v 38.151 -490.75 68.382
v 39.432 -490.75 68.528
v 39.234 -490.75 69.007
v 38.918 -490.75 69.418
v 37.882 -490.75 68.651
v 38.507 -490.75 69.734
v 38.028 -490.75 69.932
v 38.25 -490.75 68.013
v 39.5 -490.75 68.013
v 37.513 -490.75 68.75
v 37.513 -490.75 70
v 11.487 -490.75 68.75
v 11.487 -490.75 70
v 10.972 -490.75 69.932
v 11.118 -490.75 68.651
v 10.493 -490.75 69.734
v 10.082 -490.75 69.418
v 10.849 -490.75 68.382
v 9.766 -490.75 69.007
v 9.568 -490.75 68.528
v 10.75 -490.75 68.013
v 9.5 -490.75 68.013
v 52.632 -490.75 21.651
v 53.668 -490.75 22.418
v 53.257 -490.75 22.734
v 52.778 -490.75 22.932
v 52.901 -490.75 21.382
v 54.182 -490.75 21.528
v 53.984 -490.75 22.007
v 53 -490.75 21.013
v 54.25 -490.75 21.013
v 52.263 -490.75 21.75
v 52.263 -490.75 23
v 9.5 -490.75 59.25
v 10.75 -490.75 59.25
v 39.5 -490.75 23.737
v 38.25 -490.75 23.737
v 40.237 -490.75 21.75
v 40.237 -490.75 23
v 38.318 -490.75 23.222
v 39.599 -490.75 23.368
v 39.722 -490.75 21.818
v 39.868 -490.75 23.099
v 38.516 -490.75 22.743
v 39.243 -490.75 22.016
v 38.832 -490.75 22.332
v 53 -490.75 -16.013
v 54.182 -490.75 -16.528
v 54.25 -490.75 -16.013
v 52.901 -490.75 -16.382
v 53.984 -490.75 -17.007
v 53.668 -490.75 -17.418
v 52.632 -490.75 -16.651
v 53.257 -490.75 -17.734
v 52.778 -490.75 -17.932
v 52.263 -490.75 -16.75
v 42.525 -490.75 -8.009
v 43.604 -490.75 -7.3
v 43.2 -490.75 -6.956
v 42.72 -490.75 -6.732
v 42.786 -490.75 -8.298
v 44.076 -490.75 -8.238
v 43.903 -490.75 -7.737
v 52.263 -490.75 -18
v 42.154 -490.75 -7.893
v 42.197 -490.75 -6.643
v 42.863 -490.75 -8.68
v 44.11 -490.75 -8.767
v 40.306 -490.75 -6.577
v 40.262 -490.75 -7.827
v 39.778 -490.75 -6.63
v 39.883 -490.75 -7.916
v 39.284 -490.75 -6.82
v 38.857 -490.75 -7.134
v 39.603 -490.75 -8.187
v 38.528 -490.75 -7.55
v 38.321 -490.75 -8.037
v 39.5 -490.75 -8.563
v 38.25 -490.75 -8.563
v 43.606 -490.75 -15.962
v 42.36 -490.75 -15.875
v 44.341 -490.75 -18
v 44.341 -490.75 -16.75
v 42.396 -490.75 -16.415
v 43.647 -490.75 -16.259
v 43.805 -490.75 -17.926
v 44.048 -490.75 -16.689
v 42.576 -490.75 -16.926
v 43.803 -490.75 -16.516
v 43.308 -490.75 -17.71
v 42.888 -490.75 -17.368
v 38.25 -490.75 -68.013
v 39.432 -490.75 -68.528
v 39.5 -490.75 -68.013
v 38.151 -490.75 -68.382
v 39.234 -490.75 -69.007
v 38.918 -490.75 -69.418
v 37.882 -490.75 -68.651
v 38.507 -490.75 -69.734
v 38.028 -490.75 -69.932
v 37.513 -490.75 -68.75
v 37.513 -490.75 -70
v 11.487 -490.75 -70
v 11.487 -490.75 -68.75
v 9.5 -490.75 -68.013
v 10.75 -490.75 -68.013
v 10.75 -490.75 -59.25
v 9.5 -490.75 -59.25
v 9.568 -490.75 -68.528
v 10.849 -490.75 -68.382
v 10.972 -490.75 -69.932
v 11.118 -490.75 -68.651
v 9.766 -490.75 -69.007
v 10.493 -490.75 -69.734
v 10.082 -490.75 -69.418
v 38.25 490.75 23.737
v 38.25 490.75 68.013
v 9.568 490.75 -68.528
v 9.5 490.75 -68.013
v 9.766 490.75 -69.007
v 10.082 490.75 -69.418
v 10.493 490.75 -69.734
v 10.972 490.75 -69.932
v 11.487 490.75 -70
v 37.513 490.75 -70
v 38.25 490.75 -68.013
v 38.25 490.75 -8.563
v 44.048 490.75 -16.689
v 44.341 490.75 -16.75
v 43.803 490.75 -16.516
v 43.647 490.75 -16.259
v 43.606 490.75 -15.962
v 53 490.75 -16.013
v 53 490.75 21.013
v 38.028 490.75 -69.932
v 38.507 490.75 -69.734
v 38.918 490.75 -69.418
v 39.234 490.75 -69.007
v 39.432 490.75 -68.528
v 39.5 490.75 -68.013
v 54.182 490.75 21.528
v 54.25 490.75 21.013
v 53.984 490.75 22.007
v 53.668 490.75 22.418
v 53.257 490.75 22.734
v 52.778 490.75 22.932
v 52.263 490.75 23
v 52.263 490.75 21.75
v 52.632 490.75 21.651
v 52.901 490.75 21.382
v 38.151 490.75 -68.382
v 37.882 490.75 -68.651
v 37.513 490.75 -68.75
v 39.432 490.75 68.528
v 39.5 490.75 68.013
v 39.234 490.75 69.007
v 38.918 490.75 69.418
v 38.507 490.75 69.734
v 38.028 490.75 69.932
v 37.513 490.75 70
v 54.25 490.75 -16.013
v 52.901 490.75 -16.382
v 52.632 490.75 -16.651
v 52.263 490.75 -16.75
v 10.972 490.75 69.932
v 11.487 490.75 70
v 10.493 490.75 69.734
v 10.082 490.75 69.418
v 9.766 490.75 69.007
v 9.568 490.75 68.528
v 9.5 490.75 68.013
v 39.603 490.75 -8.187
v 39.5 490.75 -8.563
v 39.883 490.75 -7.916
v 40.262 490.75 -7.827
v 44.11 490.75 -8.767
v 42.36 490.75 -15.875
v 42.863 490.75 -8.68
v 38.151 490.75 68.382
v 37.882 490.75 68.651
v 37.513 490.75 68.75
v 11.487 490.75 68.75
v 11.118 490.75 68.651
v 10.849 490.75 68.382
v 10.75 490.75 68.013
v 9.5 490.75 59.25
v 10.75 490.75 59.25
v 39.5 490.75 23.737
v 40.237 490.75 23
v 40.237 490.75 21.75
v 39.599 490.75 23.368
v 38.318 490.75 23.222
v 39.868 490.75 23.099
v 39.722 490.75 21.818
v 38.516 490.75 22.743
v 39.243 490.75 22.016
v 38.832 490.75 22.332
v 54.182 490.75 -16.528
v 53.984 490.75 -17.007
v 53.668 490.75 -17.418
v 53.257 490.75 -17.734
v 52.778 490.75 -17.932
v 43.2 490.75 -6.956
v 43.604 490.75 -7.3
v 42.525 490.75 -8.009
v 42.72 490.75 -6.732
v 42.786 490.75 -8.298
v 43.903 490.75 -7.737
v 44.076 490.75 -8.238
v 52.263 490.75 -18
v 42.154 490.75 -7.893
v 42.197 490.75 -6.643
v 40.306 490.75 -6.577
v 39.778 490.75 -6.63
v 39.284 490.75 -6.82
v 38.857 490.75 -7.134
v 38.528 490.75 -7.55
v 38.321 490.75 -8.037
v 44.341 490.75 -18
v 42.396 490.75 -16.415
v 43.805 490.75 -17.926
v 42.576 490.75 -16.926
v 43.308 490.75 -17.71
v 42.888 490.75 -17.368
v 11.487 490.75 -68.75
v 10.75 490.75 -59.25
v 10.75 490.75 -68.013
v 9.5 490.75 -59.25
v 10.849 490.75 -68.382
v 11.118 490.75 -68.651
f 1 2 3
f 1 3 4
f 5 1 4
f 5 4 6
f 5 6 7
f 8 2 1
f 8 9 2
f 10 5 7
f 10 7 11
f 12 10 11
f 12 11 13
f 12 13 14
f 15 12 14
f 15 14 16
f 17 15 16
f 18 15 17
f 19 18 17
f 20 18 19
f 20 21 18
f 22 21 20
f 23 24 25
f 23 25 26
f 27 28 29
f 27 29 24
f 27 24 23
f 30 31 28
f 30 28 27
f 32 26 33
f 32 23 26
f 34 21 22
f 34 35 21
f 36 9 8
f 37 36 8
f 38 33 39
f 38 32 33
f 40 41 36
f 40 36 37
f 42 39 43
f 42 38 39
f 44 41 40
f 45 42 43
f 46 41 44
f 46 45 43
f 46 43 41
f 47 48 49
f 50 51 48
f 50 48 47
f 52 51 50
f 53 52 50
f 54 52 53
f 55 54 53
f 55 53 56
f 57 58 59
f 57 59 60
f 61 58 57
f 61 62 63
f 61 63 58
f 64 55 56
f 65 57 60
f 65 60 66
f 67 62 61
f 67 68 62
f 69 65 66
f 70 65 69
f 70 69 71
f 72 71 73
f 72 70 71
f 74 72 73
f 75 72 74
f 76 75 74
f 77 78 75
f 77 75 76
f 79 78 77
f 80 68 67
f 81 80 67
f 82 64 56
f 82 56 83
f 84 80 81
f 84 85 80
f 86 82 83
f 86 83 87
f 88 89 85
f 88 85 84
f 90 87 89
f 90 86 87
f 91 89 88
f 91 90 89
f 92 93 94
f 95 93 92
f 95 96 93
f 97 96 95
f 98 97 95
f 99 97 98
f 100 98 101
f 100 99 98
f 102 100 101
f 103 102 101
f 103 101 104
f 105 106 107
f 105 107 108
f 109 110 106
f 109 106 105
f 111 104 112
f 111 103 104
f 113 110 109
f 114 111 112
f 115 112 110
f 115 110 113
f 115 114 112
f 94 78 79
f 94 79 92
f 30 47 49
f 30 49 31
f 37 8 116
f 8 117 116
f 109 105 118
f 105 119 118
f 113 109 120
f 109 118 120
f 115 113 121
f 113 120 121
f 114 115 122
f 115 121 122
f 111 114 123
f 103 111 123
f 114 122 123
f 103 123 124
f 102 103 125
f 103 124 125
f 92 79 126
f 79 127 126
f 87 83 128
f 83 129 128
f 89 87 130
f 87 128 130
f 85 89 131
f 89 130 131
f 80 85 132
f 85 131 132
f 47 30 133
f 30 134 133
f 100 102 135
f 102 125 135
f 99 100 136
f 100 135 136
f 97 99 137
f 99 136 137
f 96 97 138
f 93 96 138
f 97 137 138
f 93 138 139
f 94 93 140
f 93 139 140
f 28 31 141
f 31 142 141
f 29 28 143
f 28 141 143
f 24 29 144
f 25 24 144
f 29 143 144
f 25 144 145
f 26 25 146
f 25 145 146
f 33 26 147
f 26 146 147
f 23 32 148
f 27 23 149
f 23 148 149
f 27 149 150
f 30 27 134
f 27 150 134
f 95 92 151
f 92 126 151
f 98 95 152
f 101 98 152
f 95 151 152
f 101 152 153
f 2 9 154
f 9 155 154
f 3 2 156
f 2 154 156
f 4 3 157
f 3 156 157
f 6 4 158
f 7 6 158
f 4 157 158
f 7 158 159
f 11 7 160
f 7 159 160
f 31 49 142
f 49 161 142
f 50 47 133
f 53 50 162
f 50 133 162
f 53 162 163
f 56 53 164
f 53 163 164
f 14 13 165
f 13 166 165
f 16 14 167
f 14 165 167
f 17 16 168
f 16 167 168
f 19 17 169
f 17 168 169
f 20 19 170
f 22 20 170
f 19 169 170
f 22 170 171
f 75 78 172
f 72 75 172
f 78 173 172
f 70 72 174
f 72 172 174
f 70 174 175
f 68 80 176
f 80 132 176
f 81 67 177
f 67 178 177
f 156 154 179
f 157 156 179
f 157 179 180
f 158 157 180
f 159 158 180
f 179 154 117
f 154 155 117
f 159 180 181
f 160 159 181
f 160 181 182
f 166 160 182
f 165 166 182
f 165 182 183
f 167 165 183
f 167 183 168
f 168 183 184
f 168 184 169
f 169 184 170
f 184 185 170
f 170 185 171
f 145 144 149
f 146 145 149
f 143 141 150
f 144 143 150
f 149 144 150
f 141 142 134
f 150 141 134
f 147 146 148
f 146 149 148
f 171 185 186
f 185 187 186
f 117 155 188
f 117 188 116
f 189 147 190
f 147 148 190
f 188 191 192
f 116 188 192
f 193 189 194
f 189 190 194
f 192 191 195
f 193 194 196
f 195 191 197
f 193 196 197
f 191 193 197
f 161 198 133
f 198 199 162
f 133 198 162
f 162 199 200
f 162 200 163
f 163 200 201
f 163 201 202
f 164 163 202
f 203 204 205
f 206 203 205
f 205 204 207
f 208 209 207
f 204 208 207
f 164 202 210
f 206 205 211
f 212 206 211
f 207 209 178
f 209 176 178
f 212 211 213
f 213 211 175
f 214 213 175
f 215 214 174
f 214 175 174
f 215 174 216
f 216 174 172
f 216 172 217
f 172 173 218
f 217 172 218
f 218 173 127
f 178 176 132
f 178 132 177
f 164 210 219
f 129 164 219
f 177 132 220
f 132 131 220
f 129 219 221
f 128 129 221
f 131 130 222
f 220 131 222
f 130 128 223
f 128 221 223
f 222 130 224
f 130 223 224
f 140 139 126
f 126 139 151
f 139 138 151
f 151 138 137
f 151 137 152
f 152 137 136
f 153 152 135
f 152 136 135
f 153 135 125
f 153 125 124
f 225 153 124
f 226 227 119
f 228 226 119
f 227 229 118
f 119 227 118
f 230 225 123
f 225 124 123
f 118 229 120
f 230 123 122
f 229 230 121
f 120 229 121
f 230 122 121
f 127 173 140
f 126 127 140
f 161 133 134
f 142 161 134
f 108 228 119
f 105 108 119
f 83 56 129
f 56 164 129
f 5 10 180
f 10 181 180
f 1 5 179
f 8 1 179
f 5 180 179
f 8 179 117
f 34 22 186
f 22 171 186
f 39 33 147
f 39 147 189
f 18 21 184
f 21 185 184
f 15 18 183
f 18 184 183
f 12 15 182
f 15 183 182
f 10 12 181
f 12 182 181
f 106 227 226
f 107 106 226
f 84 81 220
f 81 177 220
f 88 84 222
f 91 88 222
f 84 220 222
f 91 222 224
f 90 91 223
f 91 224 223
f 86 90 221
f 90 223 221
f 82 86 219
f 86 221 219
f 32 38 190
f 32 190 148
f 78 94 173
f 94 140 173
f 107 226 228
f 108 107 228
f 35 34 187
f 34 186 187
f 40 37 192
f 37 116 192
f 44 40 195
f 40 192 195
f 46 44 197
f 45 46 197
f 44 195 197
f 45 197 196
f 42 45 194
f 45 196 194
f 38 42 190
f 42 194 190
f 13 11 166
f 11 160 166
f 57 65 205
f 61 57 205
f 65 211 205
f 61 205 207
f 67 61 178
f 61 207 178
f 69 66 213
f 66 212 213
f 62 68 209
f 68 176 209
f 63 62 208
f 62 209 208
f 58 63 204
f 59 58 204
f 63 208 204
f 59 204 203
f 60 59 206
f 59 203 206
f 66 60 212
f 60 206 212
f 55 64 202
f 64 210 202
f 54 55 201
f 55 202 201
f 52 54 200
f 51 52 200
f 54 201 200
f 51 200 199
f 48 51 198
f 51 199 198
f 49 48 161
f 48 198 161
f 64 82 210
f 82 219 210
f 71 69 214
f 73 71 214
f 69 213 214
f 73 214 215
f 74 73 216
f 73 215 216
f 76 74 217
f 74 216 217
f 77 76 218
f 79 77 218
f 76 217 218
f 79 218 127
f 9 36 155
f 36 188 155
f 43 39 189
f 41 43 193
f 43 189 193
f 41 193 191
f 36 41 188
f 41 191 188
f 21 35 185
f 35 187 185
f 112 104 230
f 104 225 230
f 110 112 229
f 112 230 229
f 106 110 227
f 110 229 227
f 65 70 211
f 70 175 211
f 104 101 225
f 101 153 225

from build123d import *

# Parameters (mm, degrees)
BASE_FLANGE1_DEPTH = 490.75


# Sheet-metal steps are written as plain solids
with BuildPart() as part:
    # Sketch1 → Base-Flange1 (new, symmetric)
    with BuildSketch(Plane(origin=(0, 0, 0), x_dir=(1, 0, 0), z_dir=(0, 1, 0))):
        with BuildLine():
            Line((9.5, 59.25), (9.5, 68.0134))
            ThreePointArc((9.5, 68.0134), (10.081861668, 69.418138332), (11.4866, 70))
            Line((11.4866, 70), (37.5134, 70))
            ThreePointArc((37.5134, 70), (38.918138332, 69.418138332), (39.5, 68.0134))
            Line((39.5, 68.0134), (39.5, 23))
            Line((39.5, 23), (39.5, 8.562771629))
            ThreePointArc((39.5, 8.562771629), (39.724914644, 8.032905932), (40.262306969, 7.826620346))
            Line((40.262306969, 7.826620346), (42.153527557, 7.892663224))
            ThreePointArc((42.153527557, 7.892663224), (42.675221066, 8.135932903), (42.862626267, 8.680197126))
            Line((42.862626267, 8.680197126), (42.359529101, 15.874821789))
            ThreePointArc((42.359529101, 15.874821789), (42.88838258, 17.368257942), (44.341289843, 18))
            Line((44.341289843, 18), (52.2634, 18))
            ThreePointArc((52.2634, 18), (53.668138332, 17.418138332), (54.25, 16.0134))
            Line((54.25, 16.0134), (54.25, -21.0134))
            ThreePointArc((54.25, -21.0134), (53.668138332, -22.418138332), (52.2634, -23))
            Line((52.2634, -23), (40.2366, -23))
            ThreePointArc((40.2366, -23), (39.715745145, -23.215745145), (39.5, -23.7366))
            Line((39.5, -23.7366), (39.5, -68.0134))
            ThreePointArc((39.5, -68.0134), (38.918138332, -69.418138332), (37.5134, -70))
            Line((37.5134, -70), (11.4866, -70))
            ThreePointArc((11.4866, -70), (10.081861668, -69.418138332), (9.5, -68.0134))
            Line((9.5, -68.0134), (9.5, -59.25))
            Line((9.5, -59.25), (10.75, -59.25))
            Line((10.75, -59.25), (10.75, -68.0134))
            ThreePointArc((10.75, -68.0134), (10.965745145, -68.534254855), (11.4866, -68.75))
            Line((11.4866, -68.75), (37.5134, -68.75))
            ThreePointArc((37.5134, -68.75), (38.034254855, -68.534254855), (38.25, -68.0134))
            Line((38.25, -68.0134), (38.25, -23.7366))
            ThreePointArc((38.25, -23.7366), (38.831861668, -22.331861668), (40.2366, -21.75))
            Line((40.2366, -21.75), (52.2634, -21.75))
            ThreePointArc((52.2634, -21.75), (52.784254855, -21.534254855), (53, -21.0134))
            Line((53, -21.0134), (53, 16.0134))
            ThreePointArc((53, 16.0134), (52.784254855, 16.534254855), (52.2634, 16.75))
            Line((52.2634, 16.75), (44.341289843, 16.75))
            ThreePointArc((44.341289843, 16.75), (43.802574707, 16.515759992), (43.606484164, 15.962017381))
            Line((43.606484164, 15.962017381), (44.10958133, 8.767392718))
            ThreePointArc((44.10958133, 8.767392718), (43.604152098, 7.299519645), (42.197151928, 6.64342469))
            Line((42.197151928, 6.64342469), (40.30593134, 6.577381812))
            ThreePointArc((40.30593134, 6.577381812), (38.856591681, 7.133731182), (38.25, 8.562771629))
            Line((38.25, 8.562771629), (38.25, 23))
            Line((38.25, 23), (38.25, 68.0134))
            ThreePointArc((38.25, 68.0134), (38.034254855, 68.534254855), (37.5134, 68.75))
            Line((37.5134, 68.75), (11.4866, 68.75))
            ThreePointArc((11.4866, 68.75), (10.965745145, 68.534254855), (10.75, 68.0134))
            Line((10.75, 68.0134), (10.75, 59.25))
            Line((10.75, 59.25), (9.5, 59.25))
        make_face()
    extrude(amount=BASE_FLANGE1_DEPTH, both=True)


solid = part.part
